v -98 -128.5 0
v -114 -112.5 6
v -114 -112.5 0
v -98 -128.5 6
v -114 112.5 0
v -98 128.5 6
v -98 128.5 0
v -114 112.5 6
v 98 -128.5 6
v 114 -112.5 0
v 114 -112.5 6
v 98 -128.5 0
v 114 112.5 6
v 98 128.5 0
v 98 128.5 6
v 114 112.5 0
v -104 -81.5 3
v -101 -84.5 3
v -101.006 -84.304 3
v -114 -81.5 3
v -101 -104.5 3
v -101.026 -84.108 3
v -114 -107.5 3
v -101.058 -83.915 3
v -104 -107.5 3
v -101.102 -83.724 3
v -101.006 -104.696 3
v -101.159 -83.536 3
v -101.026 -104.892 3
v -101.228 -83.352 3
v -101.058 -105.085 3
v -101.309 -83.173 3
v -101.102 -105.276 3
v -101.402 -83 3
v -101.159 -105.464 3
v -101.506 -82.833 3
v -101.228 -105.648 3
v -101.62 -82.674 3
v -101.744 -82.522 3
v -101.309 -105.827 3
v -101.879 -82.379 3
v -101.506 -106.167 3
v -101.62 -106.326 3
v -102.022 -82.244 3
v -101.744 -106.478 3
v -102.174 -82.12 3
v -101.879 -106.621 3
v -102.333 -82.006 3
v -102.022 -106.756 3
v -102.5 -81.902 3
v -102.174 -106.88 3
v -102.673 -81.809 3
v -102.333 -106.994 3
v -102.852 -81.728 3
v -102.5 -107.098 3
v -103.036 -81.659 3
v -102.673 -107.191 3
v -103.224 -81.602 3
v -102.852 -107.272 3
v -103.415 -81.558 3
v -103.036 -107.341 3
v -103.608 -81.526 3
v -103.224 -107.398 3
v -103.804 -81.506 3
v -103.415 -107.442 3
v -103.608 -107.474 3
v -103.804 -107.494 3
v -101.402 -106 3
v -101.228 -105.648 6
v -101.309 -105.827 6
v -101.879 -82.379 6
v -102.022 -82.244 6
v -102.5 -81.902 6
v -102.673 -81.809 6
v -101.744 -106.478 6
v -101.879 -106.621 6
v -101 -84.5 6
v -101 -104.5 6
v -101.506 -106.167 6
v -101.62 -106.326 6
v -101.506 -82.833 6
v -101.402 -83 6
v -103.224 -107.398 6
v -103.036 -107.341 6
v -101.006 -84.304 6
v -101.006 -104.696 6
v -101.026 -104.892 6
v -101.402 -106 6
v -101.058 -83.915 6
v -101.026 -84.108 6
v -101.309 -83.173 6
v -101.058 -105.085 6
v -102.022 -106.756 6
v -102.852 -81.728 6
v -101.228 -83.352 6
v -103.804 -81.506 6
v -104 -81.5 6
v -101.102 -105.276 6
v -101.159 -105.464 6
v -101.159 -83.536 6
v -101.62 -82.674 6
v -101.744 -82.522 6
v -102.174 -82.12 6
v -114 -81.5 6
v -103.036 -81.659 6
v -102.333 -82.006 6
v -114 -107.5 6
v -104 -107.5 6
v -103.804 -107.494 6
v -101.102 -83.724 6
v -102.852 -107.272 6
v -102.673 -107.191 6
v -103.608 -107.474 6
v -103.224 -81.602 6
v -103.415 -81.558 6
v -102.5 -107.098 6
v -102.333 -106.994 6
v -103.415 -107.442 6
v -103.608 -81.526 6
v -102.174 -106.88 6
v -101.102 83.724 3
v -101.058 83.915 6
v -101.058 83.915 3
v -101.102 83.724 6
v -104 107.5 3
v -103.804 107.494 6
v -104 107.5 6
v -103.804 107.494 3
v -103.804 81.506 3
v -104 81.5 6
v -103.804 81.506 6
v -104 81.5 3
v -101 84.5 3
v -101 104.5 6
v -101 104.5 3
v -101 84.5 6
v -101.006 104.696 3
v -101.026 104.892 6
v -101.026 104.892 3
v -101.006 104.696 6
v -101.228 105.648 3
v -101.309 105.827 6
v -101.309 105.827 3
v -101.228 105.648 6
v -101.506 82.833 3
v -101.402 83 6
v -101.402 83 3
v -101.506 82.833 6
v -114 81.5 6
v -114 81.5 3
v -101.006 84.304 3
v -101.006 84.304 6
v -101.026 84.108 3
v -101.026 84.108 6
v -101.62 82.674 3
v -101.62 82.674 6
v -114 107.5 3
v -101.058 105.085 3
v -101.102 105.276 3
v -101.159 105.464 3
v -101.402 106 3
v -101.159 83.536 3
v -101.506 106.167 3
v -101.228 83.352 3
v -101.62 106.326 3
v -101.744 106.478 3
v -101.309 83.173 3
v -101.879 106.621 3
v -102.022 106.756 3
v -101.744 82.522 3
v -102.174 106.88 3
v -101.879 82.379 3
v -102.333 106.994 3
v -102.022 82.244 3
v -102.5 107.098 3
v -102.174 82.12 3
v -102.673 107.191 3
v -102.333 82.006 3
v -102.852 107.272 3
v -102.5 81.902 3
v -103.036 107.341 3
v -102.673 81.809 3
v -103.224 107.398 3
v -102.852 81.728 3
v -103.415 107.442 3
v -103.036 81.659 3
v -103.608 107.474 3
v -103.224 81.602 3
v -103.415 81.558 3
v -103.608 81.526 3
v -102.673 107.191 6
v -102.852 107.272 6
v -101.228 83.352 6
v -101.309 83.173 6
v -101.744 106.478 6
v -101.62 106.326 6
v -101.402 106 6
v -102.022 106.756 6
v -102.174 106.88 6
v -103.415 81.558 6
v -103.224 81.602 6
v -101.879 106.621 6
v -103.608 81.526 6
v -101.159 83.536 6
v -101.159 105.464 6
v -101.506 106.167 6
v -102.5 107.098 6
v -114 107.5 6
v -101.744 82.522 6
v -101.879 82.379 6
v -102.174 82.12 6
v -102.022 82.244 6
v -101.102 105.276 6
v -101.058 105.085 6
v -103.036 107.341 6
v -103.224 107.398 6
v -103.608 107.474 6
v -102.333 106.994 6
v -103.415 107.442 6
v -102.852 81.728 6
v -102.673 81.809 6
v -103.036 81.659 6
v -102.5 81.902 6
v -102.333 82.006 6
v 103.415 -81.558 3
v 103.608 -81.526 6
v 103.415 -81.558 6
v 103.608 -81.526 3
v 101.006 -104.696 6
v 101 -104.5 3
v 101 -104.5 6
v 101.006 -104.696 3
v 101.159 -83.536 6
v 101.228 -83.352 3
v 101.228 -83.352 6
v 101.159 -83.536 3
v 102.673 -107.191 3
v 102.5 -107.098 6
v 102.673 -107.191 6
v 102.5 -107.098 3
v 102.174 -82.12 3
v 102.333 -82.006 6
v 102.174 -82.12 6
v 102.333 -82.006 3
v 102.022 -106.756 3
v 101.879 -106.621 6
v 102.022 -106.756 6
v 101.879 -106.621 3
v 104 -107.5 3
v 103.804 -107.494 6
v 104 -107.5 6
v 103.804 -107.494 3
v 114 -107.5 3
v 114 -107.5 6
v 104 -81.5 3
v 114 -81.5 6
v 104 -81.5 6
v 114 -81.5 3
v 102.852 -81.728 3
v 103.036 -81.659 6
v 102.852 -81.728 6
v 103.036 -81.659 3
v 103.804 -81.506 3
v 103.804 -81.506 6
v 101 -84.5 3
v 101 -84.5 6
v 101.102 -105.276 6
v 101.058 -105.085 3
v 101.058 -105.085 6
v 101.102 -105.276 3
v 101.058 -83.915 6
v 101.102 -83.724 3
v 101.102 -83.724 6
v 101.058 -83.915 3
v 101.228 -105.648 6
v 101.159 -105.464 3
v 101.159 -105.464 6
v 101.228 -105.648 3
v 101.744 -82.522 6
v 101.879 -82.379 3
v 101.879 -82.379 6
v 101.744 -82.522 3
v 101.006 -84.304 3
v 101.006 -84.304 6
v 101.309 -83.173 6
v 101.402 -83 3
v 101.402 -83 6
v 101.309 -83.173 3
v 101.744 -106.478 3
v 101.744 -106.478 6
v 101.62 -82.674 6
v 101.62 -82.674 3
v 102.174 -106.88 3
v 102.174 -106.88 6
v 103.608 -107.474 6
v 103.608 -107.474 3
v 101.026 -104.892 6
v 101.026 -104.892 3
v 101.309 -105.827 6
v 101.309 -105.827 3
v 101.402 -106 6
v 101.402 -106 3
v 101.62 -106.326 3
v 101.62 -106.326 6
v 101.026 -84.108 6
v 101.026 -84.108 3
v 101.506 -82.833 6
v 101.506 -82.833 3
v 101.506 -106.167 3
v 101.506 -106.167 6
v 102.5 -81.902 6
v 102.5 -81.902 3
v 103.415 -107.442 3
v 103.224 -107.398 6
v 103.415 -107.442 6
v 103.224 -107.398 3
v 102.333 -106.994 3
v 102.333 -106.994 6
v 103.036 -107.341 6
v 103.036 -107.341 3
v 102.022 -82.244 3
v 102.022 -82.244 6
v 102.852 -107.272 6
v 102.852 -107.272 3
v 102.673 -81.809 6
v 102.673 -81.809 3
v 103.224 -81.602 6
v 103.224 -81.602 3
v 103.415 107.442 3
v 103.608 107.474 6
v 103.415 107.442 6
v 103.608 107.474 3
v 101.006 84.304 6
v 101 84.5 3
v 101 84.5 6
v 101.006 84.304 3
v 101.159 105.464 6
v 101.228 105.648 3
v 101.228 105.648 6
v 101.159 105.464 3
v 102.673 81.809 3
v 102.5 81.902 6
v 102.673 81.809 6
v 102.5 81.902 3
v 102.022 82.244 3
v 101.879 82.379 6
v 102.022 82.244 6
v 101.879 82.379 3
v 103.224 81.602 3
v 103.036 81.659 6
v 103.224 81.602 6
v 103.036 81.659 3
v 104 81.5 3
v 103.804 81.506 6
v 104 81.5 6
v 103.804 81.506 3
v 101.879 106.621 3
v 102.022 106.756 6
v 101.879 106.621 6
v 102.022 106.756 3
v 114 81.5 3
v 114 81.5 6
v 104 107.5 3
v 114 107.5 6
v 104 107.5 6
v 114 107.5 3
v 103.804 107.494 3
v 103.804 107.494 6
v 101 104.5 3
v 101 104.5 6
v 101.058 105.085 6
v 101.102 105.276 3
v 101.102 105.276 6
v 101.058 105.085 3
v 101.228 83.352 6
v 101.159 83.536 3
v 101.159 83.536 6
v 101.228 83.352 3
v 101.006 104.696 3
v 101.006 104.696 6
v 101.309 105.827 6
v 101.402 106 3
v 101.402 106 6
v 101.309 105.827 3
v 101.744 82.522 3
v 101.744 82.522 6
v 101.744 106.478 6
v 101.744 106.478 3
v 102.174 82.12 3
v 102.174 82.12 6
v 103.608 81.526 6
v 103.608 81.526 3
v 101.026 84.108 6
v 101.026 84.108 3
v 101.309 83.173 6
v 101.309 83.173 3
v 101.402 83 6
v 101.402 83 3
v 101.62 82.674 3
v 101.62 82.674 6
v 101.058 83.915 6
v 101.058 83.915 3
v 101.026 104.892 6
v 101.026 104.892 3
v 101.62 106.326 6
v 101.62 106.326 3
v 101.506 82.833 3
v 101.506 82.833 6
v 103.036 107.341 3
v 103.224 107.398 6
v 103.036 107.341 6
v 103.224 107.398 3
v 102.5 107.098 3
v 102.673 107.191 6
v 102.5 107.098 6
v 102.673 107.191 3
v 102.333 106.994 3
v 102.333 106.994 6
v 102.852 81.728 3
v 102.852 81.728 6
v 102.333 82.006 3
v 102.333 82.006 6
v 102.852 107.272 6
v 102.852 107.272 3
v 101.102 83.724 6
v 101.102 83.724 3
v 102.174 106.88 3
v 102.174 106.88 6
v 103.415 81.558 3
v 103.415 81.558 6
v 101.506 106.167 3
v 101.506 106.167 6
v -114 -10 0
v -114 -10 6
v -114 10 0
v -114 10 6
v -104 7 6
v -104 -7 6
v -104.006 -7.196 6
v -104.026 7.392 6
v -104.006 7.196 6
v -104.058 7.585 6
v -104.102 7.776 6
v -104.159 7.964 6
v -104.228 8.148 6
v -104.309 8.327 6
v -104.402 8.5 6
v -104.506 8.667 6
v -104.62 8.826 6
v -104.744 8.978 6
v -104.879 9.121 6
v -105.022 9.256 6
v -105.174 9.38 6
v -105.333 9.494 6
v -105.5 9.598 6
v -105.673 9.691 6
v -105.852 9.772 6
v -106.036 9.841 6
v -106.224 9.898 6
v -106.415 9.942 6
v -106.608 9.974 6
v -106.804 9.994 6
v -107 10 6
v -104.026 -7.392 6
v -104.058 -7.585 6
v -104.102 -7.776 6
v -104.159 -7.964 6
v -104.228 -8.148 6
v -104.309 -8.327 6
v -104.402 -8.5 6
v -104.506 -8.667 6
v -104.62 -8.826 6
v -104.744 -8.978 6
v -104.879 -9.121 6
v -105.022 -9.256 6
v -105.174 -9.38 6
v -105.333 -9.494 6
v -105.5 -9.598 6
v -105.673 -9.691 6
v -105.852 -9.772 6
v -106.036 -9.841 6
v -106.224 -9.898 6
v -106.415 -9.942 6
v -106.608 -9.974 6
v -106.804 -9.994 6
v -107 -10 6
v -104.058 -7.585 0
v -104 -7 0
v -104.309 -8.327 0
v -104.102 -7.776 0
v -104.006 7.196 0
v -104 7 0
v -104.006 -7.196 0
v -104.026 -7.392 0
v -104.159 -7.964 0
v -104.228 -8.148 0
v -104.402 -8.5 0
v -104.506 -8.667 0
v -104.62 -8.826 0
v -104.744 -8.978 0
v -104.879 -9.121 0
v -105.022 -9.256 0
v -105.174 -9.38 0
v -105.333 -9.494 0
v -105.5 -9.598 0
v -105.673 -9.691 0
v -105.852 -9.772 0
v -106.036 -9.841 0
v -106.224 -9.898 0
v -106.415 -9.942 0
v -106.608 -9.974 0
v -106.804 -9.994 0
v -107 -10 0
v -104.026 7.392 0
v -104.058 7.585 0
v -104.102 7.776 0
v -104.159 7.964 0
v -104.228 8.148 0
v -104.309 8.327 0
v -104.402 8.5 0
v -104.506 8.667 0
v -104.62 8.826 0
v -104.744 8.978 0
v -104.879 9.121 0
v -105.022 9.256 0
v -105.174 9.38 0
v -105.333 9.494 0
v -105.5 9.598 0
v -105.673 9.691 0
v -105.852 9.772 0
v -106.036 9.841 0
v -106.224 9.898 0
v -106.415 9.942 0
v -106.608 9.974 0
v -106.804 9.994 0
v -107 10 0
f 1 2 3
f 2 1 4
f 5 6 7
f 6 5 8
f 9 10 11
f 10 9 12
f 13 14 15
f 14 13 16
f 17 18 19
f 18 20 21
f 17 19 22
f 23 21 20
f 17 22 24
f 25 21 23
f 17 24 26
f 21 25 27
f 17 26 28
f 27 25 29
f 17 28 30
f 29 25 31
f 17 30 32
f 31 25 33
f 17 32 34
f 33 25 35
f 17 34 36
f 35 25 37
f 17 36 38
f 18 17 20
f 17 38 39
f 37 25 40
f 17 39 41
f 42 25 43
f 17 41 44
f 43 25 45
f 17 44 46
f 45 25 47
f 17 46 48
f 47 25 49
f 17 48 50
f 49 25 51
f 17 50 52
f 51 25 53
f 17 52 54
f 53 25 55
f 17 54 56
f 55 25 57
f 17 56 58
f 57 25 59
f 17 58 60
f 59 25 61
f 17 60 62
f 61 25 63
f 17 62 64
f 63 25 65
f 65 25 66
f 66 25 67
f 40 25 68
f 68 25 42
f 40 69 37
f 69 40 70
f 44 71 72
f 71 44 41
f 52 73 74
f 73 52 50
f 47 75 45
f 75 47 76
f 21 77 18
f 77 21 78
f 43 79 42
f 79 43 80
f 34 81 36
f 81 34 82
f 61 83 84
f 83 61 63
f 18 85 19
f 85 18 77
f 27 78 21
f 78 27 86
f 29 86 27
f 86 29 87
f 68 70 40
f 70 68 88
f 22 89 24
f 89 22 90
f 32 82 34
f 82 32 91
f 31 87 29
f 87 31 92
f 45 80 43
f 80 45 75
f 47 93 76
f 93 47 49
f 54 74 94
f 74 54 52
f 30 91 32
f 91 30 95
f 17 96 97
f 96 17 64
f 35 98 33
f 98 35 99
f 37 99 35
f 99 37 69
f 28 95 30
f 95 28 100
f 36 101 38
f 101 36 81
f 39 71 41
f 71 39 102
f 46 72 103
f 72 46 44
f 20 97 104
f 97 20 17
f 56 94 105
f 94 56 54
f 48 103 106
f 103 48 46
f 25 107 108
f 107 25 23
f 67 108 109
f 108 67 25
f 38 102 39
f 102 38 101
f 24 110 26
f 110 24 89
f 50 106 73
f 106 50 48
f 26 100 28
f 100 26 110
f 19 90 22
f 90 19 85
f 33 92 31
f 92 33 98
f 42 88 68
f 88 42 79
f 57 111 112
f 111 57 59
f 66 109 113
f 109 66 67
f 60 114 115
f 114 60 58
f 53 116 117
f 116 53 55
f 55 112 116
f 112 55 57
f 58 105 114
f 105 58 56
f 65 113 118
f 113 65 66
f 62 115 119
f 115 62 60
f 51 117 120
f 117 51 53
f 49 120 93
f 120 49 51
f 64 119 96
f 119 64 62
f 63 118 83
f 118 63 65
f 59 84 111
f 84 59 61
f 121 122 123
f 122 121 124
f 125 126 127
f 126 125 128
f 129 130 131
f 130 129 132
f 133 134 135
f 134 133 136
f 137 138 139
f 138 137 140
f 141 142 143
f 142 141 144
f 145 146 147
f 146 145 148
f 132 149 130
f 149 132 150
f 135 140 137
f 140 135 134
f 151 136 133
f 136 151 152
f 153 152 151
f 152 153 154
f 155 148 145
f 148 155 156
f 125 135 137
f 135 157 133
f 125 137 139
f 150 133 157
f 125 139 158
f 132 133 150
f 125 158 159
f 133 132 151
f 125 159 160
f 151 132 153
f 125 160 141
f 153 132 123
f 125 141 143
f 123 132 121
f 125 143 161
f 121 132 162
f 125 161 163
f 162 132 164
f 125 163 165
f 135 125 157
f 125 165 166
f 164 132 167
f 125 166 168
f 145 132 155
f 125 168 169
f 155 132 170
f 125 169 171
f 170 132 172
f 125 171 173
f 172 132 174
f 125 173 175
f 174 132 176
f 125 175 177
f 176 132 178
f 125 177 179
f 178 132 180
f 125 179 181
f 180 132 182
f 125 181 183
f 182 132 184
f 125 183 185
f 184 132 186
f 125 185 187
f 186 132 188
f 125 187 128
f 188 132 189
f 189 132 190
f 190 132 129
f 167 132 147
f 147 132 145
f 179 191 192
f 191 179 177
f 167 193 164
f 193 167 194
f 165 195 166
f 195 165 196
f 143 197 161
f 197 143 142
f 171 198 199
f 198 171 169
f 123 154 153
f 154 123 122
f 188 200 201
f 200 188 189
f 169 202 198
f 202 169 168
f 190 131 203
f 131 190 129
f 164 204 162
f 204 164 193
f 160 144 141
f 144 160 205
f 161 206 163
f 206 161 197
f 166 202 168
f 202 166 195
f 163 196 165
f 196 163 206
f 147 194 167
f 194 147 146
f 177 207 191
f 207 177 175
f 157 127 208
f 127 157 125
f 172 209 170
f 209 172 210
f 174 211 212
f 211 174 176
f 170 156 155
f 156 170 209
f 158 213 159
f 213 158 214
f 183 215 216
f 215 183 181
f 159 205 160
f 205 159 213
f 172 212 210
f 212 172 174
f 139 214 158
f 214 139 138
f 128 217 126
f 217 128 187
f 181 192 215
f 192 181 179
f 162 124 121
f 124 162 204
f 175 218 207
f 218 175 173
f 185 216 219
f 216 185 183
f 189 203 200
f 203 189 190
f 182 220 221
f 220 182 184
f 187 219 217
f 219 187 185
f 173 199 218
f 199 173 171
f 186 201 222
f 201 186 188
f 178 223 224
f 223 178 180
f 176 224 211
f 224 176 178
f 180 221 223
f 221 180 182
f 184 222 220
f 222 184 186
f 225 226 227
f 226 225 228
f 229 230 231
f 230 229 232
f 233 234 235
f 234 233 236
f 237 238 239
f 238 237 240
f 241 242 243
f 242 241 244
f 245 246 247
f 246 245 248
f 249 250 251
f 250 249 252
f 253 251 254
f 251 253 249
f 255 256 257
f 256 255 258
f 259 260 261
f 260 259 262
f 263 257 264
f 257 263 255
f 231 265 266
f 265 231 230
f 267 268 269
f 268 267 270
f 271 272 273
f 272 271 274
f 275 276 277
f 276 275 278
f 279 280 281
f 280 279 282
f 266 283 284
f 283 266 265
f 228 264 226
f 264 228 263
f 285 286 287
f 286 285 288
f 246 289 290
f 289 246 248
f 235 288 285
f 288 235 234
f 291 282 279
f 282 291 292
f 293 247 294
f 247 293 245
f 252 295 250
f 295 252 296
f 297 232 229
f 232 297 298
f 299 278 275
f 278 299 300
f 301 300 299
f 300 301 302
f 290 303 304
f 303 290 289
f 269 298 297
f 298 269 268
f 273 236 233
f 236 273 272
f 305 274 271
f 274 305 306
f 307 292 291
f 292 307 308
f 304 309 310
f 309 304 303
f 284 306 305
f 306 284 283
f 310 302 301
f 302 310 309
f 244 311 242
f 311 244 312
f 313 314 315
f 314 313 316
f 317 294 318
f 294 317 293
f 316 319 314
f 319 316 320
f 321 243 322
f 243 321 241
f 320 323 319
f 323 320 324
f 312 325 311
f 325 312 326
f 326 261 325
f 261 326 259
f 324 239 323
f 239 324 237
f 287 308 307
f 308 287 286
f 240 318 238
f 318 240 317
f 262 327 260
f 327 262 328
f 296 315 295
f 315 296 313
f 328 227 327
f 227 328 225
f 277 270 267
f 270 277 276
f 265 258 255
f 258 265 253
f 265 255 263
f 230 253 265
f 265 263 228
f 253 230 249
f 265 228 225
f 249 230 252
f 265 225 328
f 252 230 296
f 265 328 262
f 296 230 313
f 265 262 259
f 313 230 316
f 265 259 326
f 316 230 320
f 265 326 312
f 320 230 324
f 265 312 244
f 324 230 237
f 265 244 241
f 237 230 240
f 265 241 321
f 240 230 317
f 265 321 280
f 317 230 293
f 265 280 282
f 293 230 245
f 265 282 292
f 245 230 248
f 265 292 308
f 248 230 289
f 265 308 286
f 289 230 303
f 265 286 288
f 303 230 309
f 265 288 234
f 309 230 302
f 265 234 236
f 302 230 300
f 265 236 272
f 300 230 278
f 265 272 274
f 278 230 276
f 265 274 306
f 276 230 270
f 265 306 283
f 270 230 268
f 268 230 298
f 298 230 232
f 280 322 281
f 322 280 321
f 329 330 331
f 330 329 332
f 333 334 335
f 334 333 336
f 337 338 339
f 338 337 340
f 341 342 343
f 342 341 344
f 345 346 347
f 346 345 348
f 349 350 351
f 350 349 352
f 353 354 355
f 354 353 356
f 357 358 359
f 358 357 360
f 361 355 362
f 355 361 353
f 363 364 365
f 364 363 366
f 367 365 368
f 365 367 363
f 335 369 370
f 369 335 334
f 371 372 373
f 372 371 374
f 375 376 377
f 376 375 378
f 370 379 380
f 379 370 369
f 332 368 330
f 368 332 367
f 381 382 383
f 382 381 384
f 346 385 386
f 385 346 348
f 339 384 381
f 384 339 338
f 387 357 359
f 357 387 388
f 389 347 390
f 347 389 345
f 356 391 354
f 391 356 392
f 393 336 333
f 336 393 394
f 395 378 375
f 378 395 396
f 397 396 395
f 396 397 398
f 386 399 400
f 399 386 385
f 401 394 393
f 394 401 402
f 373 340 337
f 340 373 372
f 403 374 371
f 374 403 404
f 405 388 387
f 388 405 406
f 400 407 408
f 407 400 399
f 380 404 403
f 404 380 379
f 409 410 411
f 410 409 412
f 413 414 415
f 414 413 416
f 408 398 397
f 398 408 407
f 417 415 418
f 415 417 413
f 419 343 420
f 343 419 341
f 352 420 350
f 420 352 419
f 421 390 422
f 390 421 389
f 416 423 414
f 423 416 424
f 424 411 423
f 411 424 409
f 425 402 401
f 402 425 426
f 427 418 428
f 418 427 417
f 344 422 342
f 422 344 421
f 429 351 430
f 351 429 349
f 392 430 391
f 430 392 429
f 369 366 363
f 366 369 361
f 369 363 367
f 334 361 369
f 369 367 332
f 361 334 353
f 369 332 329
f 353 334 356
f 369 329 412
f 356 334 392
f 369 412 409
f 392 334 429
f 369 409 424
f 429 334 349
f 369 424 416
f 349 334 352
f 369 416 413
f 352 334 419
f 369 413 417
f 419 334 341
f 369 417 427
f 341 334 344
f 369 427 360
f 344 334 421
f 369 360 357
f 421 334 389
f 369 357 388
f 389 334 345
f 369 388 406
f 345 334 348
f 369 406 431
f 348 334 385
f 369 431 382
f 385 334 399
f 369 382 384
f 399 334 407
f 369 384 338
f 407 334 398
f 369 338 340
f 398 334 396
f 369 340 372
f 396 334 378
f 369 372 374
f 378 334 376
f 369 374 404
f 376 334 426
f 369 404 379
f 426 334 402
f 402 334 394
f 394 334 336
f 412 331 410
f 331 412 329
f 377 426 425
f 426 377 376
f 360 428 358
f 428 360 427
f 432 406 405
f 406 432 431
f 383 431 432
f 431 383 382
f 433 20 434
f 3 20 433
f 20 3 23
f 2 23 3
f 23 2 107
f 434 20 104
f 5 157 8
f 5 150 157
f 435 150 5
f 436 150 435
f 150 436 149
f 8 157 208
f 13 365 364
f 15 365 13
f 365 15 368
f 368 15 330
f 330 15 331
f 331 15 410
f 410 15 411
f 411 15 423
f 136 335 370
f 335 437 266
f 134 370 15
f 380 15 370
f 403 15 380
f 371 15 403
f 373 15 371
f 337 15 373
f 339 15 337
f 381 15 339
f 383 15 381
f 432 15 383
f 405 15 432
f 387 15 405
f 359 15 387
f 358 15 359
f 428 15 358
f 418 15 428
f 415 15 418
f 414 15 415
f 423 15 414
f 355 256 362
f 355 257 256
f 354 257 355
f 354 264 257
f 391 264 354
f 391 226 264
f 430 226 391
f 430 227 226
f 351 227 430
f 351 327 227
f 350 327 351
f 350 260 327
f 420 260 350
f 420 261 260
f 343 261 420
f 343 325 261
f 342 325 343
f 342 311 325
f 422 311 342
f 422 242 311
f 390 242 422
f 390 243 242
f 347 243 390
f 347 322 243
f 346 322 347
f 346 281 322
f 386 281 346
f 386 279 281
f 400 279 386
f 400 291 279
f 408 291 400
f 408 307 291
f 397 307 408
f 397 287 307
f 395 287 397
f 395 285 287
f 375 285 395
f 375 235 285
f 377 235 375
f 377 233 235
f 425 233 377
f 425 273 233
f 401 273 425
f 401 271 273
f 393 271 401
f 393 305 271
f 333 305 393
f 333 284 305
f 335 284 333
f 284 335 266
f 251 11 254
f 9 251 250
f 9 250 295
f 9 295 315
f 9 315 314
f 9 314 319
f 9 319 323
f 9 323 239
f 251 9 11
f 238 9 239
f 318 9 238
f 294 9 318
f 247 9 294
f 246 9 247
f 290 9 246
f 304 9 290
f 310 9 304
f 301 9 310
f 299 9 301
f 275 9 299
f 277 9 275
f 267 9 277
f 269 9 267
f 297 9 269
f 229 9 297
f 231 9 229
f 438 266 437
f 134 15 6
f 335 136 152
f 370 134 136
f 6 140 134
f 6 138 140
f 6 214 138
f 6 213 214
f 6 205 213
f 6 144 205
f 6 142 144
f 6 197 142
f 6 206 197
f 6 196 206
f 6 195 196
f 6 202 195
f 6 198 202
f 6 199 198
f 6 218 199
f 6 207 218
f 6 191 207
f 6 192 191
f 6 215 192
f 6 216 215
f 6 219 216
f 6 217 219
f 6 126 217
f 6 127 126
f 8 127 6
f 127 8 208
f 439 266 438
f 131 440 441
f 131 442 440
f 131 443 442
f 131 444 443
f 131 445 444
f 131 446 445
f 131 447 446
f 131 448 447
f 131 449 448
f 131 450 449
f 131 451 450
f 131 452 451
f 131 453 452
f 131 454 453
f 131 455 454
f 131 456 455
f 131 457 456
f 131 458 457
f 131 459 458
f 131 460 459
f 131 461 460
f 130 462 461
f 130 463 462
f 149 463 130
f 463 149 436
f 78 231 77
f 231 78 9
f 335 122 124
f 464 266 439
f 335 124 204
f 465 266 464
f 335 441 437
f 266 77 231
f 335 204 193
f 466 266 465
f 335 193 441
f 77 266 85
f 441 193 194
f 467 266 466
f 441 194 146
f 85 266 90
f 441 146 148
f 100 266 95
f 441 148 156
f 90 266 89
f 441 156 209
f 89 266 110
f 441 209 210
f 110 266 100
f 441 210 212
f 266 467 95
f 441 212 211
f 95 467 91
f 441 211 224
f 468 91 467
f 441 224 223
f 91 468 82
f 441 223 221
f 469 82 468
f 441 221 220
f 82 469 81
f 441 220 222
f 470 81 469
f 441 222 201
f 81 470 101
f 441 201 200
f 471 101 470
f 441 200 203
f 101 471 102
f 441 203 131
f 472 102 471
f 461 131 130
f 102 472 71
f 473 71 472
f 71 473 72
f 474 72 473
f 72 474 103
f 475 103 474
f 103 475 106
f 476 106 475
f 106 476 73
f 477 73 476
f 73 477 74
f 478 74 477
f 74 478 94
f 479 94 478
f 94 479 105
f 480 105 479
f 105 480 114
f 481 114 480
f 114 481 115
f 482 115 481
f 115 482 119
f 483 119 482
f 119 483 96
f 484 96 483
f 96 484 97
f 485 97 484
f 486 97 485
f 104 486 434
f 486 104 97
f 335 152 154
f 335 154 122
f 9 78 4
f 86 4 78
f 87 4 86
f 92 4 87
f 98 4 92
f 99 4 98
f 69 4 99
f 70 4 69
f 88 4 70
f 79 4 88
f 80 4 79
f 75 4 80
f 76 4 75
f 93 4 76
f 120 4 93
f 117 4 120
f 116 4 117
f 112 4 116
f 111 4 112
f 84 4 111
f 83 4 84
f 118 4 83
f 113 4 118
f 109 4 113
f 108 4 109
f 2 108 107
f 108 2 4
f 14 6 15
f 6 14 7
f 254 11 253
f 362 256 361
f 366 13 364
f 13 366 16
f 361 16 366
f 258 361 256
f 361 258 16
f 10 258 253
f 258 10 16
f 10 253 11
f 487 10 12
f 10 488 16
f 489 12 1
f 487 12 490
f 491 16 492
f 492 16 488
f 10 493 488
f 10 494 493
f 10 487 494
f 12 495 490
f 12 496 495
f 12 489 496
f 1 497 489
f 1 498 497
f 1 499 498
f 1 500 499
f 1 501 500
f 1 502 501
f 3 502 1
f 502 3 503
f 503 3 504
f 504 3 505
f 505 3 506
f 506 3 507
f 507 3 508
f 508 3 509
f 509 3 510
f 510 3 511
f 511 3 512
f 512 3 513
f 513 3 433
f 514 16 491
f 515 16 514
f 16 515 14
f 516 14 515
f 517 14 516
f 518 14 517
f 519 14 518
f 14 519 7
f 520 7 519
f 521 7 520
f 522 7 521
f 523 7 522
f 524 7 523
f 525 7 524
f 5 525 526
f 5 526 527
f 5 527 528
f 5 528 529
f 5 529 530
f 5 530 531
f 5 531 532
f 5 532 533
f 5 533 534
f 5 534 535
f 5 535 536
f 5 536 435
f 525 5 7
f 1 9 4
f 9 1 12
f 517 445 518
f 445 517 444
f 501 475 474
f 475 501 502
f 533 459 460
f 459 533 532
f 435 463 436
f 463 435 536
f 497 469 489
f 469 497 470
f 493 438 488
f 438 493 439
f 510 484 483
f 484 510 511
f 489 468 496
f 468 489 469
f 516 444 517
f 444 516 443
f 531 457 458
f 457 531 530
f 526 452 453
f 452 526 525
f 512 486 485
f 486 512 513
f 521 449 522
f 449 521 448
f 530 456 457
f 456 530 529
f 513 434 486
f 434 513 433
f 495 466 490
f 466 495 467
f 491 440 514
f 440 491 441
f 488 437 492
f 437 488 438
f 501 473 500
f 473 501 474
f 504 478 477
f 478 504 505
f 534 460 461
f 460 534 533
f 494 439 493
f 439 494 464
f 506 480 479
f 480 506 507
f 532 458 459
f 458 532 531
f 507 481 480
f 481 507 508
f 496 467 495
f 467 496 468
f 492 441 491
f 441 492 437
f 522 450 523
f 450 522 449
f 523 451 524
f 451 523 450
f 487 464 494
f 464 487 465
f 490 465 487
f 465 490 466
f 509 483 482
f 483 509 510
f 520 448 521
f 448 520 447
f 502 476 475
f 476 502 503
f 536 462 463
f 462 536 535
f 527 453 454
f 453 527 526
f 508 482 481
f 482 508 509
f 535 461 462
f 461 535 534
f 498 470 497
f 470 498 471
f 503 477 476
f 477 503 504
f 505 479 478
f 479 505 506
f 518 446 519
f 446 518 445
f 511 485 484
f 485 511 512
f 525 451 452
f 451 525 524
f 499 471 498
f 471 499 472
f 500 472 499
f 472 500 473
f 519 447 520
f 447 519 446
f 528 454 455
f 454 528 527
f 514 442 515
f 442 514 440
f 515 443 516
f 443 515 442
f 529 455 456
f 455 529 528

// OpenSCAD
// file: ../OpenSCAD_Modules/cube_vround.scad
module cube_vround(
	size=[10,10,10],
	round_corners=[true,true,true,true],
	rounding=3,
	center_xy=false,
	center_z=false,
	attach=0,
	wall_attach=0,
	quality=2, //integer from 1 to infinity
)
{
	assert(len(size)==3);
	assert(len(round_corners)==4);
	assert(rounding>0);
	assert(rounding<=size[0]/2);
	assert(rounding<=size[1]/2);
	assert(quality>0);
	assert(attach>=0);
	assert(wall_attach>=0);
	height=size[2]+attach;
	cyl_r=rounding+wall_attach;
	cyl_mvx=size[0]/2-rounding;
	cyl_mvy=size[1]/2-rounding;
	cube_szx=size[0]/2;
	cube_szy=size[1]/2;
	cube_mvx=cube_szx/2+wall_attach;
	cube_mvy=cube_szy/2+wall_attach;
	translate([center_xy?0:cube_szx,center_xy?0:cube_szy,center_z?-attach/2:(size[2]-attach)/2])
		hull()
		{
			if(round_corners[0])
				translate([cyl_mvx,cyl_mvy])
					cylinder(r=cyl_r,h=height,$fn=12*quality,center=true);
			else
				translate([cube_mvx,cube_mvy])
					cube([cube_szx,cube_szy,height],center=true);
			if(round_corners[1])
				translate([cyl_mvx,-cyl_mvy])
					cylinder(r=cyl_r,h=height,$fn=12*quality,center=true);
			else
				translate([cube_mvx,-cube_mvy])
					cube([cube_szx,cube_szy,height],center=true);
			if(round_corners[2])
				translate([-cyl_mvx,-cyl_mvy])
					cylinder(r=cyl_r,h=height,$fn=12*quality,center=true);
			else
				translate([-cube_mvx,-cube_mvy])
					cube([cube_szx,cube_szy,height],center=true);
			if(round_corners[3])
				translate([-cyl_mvx,cyl_mvy])
					cylinder(r=cyl_r,h=height,$fn=12*quality,center=true);
			else
				translate([-cube_mvx,cube_mvy])
					cube([cube_szx,cube_szy,height],center=true);
		};
}

//example
cube_vround(round_corners=[true,false,true,false],
size=[10,20,6],
attach=0.1,
wall_attach=0.1,
rounding=3,
center_xy=true,center_z=false);
// main file
use <../OpenSCAD_Modules/cube_vround.scad>

module plate
(
	size=[228,257,6],
	outer_cut_sz=16,
	clip_cut_sz=[13,20,3],
	clip_shift=189,
	clip_rounding=3,
	wire_clip_sz=[10,20],
	quality=8,
)
{
	cutClr=1;
	difference()
	{
		//base
		cube_vround(
			size=size,
			round_corners=[false,false,false,false],
			center_xy=true,quality=quality
		);
		//corner cuts
		for(i=[-1:2:1],j=[-1:2:1])
		translate([size[0]/2*i,size[1]/2*j,-cutClr])
		rotate(v=[0,0,1],a=
			(i>0&&j>0)?180:
			(i<0&&j<0)?0:
			(i>0&&j<0)?90:270)
		linear_extrude(height=size[2]+2*cutClr)
		polygon(points=[
			[-cutClr,-cutClr],
			[-cutClr,outer_cut_sz],
			[0,outer_cut_sz],
			[outer_cut_sz,0],
			[outer_cut_sz,-cutClr]]);
		//side clip cuts
		for(i=[-1:2:1],j=[-1:2:1])
		translate(
			[i*(size[0]/2-clip_cut_sz[0]/2+cutClr/2),
			j*clip_shift/2,
			size[2]-clip_cut_sz[2]])
		cube_vround(
			size=[clip_cut_sz[0]+cutClr,clip_cut_sz[1]+clip_rounding*2,clip_cut_sz[2]+cutClr],
			round_corners=[i<0,i<0,i>0,i>0],
			rounding=clip_rounding,
			center_xy=true,
			quality=quality
		);

		//bottom cut
		translate([-size[0]/2+wire_clip_sz[0]/2-cutClr/2,
			0,-cutClr])
		cube_vround(
			size=[wire_clip_sz[0]+cutClr,wire_clip_sz[1],size[2]+cutClr*2],
			round_corners=[true,true,false,false],
			rounding=clip_rounding,
			center_xy=true,
			quality=quality
		);
	}

}

plate();
